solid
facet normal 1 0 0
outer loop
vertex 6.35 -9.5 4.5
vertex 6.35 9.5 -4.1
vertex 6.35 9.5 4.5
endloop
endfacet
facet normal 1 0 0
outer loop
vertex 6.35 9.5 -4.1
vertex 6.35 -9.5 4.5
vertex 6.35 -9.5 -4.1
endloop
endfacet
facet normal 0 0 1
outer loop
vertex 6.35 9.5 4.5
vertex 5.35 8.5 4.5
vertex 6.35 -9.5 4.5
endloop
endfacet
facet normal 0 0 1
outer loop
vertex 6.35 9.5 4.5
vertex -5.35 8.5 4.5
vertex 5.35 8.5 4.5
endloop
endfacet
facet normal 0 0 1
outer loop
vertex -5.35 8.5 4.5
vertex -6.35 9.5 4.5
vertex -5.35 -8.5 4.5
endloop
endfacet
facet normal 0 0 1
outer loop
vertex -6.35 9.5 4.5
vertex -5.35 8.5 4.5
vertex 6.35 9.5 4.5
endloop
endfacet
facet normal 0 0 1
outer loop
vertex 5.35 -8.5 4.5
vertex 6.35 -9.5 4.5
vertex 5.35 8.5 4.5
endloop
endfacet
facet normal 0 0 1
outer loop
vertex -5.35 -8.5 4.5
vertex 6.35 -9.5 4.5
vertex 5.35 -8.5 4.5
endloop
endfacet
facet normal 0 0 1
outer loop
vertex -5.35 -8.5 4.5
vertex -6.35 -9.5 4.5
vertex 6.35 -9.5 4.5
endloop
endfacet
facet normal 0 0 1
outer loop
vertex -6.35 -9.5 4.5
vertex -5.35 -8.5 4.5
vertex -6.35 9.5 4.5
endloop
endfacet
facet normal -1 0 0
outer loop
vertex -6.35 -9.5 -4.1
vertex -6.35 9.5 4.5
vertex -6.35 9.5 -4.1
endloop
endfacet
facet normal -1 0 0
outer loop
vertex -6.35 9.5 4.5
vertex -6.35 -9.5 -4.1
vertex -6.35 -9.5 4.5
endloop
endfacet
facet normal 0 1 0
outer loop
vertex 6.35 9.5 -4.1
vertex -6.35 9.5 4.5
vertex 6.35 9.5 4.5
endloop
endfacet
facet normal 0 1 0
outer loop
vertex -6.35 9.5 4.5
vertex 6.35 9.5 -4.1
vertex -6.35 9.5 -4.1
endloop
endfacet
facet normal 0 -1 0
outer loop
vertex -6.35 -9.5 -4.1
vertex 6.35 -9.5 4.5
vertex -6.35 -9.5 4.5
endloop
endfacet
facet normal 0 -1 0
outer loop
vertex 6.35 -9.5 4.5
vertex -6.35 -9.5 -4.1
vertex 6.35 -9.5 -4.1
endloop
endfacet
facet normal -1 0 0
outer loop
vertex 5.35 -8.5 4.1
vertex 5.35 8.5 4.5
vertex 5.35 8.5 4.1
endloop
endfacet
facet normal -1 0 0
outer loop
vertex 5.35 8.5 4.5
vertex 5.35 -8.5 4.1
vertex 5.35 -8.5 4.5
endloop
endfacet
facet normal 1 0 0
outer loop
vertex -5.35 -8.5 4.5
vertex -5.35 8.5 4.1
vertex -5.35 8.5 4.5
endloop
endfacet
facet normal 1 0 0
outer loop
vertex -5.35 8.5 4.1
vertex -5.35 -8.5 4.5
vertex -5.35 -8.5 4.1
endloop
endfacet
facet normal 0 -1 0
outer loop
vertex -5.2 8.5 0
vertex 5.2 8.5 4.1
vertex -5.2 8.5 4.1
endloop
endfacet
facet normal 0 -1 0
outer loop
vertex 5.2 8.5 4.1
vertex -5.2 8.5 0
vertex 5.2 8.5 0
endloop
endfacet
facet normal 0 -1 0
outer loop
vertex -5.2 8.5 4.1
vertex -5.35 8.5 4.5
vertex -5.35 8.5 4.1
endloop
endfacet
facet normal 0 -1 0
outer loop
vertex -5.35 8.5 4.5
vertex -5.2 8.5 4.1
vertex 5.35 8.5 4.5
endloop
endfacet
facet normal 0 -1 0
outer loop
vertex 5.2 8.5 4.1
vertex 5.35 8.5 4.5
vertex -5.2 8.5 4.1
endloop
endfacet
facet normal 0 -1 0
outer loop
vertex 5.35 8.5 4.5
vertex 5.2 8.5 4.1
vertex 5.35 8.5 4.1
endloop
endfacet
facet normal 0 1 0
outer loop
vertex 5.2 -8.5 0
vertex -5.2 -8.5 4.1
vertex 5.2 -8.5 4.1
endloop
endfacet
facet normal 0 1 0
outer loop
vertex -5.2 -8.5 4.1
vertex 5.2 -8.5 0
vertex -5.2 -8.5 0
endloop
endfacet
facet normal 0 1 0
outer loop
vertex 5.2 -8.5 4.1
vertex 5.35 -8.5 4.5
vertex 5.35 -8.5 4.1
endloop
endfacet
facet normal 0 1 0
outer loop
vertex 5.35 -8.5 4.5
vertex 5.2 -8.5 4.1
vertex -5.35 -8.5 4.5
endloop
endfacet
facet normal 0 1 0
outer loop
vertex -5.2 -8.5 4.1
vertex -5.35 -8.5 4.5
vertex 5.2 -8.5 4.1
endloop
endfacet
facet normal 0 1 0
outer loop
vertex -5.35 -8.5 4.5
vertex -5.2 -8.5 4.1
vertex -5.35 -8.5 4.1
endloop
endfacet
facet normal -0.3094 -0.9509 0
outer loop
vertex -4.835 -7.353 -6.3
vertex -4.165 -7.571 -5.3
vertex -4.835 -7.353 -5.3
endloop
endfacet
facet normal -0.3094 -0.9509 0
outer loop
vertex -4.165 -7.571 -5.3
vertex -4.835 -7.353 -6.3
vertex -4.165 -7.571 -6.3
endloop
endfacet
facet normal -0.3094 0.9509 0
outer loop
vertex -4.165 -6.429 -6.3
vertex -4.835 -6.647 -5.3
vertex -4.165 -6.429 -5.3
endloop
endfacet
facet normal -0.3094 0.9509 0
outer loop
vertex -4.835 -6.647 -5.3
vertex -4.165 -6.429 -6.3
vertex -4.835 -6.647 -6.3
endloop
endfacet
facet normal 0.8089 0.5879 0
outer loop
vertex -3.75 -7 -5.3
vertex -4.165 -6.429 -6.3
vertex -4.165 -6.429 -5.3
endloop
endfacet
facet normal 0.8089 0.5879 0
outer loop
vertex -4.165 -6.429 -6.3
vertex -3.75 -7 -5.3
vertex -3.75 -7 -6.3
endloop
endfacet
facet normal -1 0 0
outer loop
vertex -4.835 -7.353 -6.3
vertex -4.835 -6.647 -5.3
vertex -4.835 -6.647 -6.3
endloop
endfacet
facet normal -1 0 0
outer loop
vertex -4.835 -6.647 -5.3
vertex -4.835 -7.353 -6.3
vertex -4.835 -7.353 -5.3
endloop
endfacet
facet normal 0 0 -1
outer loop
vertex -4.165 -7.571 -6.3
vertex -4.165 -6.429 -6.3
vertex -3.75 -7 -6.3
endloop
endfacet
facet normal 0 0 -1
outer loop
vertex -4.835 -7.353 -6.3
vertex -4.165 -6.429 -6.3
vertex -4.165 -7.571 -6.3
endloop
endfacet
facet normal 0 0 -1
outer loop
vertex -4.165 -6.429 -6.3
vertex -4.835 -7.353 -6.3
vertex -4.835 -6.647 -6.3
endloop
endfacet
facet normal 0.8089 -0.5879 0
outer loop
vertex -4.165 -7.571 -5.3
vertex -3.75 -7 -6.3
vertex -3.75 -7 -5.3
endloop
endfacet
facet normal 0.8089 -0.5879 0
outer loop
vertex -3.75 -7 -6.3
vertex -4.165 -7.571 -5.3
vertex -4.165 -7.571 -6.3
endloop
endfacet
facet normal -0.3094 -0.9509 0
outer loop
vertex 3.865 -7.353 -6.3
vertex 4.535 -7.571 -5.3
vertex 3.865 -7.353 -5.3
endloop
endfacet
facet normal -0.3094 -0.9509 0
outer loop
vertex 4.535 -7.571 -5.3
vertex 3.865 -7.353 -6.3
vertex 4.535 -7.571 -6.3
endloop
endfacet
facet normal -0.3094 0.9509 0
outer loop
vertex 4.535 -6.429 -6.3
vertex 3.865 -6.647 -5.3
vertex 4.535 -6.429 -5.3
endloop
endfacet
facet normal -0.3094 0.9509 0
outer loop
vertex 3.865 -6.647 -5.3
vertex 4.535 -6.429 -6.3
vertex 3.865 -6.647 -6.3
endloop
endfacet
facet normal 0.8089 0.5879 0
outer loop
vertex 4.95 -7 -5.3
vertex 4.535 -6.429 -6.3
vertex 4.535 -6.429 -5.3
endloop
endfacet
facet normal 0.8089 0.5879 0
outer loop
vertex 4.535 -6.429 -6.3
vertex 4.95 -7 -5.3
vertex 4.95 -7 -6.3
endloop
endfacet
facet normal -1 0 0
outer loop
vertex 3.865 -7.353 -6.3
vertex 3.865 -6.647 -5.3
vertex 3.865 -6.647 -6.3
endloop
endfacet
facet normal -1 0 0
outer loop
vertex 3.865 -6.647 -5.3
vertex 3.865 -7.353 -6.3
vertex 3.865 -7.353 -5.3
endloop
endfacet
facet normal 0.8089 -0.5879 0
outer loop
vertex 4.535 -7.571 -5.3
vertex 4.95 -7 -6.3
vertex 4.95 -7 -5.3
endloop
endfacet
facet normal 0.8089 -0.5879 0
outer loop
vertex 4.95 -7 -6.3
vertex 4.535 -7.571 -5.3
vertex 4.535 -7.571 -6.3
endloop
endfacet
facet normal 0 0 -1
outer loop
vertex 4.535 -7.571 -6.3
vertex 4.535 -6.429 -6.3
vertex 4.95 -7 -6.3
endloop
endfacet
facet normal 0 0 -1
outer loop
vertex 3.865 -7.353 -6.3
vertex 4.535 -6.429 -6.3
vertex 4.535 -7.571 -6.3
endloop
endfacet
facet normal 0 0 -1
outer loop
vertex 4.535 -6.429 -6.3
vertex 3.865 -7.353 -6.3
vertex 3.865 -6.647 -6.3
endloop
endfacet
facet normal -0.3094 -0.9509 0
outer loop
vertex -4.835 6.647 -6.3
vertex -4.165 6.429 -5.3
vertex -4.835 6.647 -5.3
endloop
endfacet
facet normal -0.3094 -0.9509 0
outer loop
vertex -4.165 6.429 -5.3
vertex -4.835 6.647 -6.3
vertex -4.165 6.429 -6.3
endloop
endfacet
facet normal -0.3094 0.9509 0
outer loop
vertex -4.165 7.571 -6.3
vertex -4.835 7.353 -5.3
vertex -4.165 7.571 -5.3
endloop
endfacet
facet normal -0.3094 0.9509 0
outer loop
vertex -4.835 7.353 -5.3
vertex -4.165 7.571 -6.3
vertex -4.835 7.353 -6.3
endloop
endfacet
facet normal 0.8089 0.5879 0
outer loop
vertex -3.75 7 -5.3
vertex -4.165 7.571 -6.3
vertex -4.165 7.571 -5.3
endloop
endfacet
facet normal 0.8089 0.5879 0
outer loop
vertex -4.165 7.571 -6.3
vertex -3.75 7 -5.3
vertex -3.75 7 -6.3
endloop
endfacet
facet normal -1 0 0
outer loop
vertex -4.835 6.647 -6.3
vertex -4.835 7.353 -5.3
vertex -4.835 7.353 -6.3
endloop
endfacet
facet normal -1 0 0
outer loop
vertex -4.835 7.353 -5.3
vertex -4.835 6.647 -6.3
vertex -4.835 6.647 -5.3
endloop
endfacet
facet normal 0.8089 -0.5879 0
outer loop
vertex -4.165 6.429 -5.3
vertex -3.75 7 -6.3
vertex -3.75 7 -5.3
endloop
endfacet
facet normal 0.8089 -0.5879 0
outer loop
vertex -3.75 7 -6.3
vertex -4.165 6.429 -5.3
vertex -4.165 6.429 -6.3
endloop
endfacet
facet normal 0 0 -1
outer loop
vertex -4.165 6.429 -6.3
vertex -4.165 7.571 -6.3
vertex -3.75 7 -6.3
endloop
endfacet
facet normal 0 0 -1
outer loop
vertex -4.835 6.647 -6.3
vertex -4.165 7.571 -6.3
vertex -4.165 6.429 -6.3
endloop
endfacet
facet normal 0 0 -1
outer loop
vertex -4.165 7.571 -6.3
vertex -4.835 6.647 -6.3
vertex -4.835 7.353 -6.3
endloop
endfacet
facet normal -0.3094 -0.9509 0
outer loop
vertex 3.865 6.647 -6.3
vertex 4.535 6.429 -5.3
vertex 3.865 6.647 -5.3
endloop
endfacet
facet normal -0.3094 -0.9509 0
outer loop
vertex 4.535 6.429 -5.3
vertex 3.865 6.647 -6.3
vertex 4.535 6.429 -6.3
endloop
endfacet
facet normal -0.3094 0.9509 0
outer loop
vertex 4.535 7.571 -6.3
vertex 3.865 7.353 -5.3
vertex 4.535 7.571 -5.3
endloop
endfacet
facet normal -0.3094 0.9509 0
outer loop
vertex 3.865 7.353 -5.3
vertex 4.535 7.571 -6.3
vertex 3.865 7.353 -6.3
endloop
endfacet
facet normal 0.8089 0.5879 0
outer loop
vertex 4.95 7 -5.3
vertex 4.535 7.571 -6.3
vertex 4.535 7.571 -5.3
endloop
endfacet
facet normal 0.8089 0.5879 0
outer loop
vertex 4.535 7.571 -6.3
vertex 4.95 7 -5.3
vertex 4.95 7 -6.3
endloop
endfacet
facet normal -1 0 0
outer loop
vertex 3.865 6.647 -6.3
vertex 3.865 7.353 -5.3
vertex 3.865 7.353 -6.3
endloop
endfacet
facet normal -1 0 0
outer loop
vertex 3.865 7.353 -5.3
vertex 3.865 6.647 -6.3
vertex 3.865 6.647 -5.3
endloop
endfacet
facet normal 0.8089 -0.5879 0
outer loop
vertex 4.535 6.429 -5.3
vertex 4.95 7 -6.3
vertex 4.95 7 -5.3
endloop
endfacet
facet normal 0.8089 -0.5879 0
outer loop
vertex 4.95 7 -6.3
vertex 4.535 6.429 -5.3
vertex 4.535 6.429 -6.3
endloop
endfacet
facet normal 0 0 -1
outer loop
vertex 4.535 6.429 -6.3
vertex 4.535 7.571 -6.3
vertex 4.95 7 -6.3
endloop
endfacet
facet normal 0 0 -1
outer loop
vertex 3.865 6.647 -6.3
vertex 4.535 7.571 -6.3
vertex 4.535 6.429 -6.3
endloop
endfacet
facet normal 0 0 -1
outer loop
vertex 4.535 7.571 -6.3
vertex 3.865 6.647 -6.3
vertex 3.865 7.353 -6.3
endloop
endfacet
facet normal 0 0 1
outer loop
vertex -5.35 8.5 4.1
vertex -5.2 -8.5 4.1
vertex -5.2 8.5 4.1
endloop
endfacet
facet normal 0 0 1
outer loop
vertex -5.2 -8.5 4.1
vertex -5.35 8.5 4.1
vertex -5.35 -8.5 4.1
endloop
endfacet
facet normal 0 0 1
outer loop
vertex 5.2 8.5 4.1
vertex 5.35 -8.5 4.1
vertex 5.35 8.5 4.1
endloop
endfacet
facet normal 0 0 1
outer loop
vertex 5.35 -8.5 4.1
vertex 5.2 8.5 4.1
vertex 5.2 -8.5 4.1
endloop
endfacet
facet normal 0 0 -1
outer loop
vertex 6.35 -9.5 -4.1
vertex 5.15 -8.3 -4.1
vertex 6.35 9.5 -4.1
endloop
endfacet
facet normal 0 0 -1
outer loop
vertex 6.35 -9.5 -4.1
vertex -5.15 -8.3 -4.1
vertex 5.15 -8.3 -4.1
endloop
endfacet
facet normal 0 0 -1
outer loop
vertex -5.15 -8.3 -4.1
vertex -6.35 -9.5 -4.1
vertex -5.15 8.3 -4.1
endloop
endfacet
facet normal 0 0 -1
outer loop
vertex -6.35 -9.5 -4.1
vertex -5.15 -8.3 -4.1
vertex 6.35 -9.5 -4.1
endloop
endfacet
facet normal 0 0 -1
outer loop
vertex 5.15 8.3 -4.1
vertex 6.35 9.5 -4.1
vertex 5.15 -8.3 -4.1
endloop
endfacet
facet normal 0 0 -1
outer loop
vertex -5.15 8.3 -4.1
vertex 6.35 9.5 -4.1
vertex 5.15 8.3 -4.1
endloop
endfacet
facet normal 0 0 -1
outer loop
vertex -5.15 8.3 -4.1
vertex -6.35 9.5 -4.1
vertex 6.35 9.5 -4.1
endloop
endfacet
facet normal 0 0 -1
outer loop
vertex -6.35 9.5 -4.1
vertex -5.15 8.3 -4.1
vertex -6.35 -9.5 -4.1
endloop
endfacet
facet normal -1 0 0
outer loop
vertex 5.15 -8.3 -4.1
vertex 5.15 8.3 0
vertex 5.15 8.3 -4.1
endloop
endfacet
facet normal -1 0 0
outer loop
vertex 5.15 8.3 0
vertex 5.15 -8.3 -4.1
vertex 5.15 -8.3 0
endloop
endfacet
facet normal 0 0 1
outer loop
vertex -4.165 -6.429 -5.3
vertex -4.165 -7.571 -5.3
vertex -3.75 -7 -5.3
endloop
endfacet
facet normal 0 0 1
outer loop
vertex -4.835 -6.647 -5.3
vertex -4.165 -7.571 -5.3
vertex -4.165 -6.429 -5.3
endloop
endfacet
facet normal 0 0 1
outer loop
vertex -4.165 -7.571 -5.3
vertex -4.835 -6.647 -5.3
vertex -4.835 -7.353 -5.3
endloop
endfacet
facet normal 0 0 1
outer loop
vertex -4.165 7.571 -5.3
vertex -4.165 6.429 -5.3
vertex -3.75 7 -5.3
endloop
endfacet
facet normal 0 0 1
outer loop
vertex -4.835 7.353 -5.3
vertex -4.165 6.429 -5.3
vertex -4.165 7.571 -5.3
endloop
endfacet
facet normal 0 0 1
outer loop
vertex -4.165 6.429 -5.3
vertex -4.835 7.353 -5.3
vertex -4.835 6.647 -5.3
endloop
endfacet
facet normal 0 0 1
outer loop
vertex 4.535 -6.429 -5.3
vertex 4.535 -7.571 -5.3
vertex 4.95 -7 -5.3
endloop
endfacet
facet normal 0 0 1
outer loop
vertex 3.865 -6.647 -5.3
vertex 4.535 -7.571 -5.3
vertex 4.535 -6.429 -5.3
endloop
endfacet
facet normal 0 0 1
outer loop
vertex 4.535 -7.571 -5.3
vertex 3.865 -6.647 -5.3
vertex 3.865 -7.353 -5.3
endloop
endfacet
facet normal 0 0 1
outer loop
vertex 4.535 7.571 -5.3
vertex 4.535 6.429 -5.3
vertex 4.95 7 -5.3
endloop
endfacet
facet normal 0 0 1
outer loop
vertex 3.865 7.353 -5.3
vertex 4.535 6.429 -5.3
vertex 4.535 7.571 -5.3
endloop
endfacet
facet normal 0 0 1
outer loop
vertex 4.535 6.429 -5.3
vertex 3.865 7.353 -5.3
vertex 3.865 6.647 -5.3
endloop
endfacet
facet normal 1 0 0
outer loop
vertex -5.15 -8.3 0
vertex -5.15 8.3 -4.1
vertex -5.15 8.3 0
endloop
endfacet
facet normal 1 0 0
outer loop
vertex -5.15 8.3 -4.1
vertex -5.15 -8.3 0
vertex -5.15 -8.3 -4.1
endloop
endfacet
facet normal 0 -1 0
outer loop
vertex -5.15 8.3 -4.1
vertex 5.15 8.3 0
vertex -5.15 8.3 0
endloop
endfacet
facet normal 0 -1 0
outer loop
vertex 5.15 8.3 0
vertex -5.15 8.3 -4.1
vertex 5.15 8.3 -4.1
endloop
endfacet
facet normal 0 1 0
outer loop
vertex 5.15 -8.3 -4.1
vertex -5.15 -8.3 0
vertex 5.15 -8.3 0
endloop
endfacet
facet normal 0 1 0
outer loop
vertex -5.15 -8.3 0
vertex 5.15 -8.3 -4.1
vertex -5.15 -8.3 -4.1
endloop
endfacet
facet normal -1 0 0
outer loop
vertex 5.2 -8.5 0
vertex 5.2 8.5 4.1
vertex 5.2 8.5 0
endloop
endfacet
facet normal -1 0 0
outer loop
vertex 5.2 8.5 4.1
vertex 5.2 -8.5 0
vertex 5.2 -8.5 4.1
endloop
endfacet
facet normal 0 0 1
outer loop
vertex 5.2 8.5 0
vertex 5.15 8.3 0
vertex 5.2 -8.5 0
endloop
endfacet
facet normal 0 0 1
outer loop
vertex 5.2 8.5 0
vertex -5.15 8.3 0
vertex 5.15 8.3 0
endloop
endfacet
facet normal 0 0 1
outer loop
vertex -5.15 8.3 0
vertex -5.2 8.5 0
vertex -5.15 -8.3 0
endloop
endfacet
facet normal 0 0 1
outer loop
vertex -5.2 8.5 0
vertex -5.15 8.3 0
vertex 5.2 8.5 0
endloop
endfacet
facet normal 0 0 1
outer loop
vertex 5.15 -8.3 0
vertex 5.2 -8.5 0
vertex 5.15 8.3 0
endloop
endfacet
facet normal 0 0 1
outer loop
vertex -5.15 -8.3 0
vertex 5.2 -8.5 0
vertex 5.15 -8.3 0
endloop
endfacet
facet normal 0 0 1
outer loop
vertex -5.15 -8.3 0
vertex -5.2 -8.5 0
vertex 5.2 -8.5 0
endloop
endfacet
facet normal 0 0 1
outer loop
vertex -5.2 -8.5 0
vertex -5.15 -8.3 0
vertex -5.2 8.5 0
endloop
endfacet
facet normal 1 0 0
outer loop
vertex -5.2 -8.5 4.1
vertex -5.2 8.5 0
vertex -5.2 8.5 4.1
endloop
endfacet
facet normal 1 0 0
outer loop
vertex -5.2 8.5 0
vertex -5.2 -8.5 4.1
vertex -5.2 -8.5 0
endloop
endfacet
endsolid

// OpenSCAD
// Parameters
body_W = 12.7; //[6.35:25.4:0.1]
body_H = 19.0; //[9.5:38.0:0.1]
body_D = 8.2; //[4.1:16.4:0.1]
overlap = 0.8; //[0.5:2.0:0.1]
bezel_thk = 1.2; //[0.6:2.4:0.1]
bezel_margin = 1.0; //[0.5:2.0:0.1]
window_thk = 0.8; //[0.4:1.6:0.1]
seg_win_W = 8.0; //[4.0:10.0:0.1]
seg_win_H = 1.6; //[0.8:3.2:0.1]
seg_gap = 1.2; //[0.6:2.4:0.1]
dp_radius = 1.0; //[0.5:2.0:0.1]
rear_cavity_wall = 1.2; //[0.6:2.4:0.1]
rear_cavity_depth = 4.5; //[2.0:7.0:0.1]
pin_radius = 0.6; //[0.3:1.2:0.1]
pin_length = 3.0; //[1.5:6.0:0.1]
pin_inset_X = 2.0; //[1.0:4.0:0.1]
pin_inset_Y = 2.5; //[1.0:5.0:0.1]

// Main Body
module main_body() {
  color("DimGray")
  cube([body_W, body_H, body_D], center=true);
}

// Front Bezel
module front_bezel() {
  difference() {
    color("Black")
    translate([0, 0, body_D/2 - bezel_thk/2 + overlap/2])
      cube([body_W, body_H, bezel_thk], center=true);
    translate([0, 0, body_D/2 - bezel_thk/2 + overlap/2])
      cube([body_W - 2*bezel_margin, body_H - 2*bezel_margin, bezel_thk + 2*overlap], center=true);
  }
}

// Segment Windows
module segment_led_windows() {
  color("White")
  union() {
    translate([0, body_H/2 - bezel_margin - seg_win_H/2 - seg_gap, body_D/2 - window_thk/2 + overlap/2])
      cube([seg_win_W, seg_win_H, window_thk + 2*overlap], center=true);
    translate([0, 0, body_D/2 - window_thk/2 + overlap/2])
      cube([seg_win_W, seg_win_H, window_thk + 2*overlap], center=true);
    translate([0, -(body_H/2 - bezel_margin - seg_win_H/2 - seg_gap), body_D/2 - window_thk/2 + overlap/2])
      cube([seg_win_W, seg_win_H, window_thk + 2*overlap], center=true);
    translate([-(seg_win_W/2 - seg_win_H/2), body_H/4, body_D/2 - window_thk/2 + overlap/2])
      cube([seg_win_H, body_H/2 - 2*bezel_margin - 2*seg_gap, window_thk + 2*overlap], center=true);
    translate([-(seg_win_W/2 - seg_win_H/2), -body_H/4, body_D/2 - window_thk/2 + overlap/2])
      cube([seg_win_H, body_H/2 - 2*bezel_margin - 2*seg_gap, window_thk + 2*overlap], center=true);
    translate([seg_win_W/2 - seg_win_H/2, body_H/4, body_D/2 - window_thk/2 + overlap/2])
      cube([seg_win_H, body_H/2 - 2*bezel_margin - 2*seg_gap, window_thk + 2*overlap], center=true);
    translate([seg_win_W/2 - seg_win_H/2, -body_H/4, body_D/2 - window_thk/2 + overlap/2])
      cube([seg_win_H, body_H/2 - 2*bezel_margin - 2*seg_gap, window_thk + 2*overlap], center=true);
  }
}

// Decimal Point
module decimal_point() {
  color("White")
  translate([body_W/2 - bezel_margin - dp_radius - seg_gap, -(body_H/2 - bezel_margin - dp_radius - seg_gap), body_D/2 - window_thk/2 + overlap/2])
    rotate([90, 0, 0])
    cylinder(r=dp_radius, h=window_thk + 2*overlap, center=true);
}

// Rear Cavity
module rear_cavity() {
  translate([0, 0, -(body_D/2 - rear_cavity_depth/2) - overlap/2])
    cube([body_W - 2*rear_cavity_wall, body_H - 2*rear_cavity_wall, rear_cavity_depth + 2*overlap], center=true);
}

// Mounting Pins
module mounting_pin(x, y) {
  translate([x, y, -(body_D/2 + pin_length/2 - overlap)])
    cylinder(r=pin_radius, h=pin_length, center=true);
}

module mounting_pins() {
  color("Silver")
  mounting_pin(-(body_W/2 - pin_inset_X), -(body_H/2 - pin_inset_Y));
  mounting_pin(body_W/2 - pin_inset_X, -(body_H/2 - pin_inset_Y));
  mounting_pin(-(body_W/2 - pin_inset_X), body_H/2 - pin_inset_Y);
  mounting_pin(body_W/2 - pin_inset_X, body_H/2 - pin_inset_Y);
}

// Segment Cutouts
module segment_cutouts() {
  translate([0, 0, body_D/2 - (body_D/2)/2])
    cube([seg_win_W + 2*seg_gap, body_H - 2*bezel_margin, body_D/2], center=true);
}

// Final Assembly
difference() {
  union() {
    main_body();
    front_bezel();
    mounting_pins();
  }
  rear_cavity();
  segment_led_windows();
  decimal_point();
  segment_cutouts();
}
